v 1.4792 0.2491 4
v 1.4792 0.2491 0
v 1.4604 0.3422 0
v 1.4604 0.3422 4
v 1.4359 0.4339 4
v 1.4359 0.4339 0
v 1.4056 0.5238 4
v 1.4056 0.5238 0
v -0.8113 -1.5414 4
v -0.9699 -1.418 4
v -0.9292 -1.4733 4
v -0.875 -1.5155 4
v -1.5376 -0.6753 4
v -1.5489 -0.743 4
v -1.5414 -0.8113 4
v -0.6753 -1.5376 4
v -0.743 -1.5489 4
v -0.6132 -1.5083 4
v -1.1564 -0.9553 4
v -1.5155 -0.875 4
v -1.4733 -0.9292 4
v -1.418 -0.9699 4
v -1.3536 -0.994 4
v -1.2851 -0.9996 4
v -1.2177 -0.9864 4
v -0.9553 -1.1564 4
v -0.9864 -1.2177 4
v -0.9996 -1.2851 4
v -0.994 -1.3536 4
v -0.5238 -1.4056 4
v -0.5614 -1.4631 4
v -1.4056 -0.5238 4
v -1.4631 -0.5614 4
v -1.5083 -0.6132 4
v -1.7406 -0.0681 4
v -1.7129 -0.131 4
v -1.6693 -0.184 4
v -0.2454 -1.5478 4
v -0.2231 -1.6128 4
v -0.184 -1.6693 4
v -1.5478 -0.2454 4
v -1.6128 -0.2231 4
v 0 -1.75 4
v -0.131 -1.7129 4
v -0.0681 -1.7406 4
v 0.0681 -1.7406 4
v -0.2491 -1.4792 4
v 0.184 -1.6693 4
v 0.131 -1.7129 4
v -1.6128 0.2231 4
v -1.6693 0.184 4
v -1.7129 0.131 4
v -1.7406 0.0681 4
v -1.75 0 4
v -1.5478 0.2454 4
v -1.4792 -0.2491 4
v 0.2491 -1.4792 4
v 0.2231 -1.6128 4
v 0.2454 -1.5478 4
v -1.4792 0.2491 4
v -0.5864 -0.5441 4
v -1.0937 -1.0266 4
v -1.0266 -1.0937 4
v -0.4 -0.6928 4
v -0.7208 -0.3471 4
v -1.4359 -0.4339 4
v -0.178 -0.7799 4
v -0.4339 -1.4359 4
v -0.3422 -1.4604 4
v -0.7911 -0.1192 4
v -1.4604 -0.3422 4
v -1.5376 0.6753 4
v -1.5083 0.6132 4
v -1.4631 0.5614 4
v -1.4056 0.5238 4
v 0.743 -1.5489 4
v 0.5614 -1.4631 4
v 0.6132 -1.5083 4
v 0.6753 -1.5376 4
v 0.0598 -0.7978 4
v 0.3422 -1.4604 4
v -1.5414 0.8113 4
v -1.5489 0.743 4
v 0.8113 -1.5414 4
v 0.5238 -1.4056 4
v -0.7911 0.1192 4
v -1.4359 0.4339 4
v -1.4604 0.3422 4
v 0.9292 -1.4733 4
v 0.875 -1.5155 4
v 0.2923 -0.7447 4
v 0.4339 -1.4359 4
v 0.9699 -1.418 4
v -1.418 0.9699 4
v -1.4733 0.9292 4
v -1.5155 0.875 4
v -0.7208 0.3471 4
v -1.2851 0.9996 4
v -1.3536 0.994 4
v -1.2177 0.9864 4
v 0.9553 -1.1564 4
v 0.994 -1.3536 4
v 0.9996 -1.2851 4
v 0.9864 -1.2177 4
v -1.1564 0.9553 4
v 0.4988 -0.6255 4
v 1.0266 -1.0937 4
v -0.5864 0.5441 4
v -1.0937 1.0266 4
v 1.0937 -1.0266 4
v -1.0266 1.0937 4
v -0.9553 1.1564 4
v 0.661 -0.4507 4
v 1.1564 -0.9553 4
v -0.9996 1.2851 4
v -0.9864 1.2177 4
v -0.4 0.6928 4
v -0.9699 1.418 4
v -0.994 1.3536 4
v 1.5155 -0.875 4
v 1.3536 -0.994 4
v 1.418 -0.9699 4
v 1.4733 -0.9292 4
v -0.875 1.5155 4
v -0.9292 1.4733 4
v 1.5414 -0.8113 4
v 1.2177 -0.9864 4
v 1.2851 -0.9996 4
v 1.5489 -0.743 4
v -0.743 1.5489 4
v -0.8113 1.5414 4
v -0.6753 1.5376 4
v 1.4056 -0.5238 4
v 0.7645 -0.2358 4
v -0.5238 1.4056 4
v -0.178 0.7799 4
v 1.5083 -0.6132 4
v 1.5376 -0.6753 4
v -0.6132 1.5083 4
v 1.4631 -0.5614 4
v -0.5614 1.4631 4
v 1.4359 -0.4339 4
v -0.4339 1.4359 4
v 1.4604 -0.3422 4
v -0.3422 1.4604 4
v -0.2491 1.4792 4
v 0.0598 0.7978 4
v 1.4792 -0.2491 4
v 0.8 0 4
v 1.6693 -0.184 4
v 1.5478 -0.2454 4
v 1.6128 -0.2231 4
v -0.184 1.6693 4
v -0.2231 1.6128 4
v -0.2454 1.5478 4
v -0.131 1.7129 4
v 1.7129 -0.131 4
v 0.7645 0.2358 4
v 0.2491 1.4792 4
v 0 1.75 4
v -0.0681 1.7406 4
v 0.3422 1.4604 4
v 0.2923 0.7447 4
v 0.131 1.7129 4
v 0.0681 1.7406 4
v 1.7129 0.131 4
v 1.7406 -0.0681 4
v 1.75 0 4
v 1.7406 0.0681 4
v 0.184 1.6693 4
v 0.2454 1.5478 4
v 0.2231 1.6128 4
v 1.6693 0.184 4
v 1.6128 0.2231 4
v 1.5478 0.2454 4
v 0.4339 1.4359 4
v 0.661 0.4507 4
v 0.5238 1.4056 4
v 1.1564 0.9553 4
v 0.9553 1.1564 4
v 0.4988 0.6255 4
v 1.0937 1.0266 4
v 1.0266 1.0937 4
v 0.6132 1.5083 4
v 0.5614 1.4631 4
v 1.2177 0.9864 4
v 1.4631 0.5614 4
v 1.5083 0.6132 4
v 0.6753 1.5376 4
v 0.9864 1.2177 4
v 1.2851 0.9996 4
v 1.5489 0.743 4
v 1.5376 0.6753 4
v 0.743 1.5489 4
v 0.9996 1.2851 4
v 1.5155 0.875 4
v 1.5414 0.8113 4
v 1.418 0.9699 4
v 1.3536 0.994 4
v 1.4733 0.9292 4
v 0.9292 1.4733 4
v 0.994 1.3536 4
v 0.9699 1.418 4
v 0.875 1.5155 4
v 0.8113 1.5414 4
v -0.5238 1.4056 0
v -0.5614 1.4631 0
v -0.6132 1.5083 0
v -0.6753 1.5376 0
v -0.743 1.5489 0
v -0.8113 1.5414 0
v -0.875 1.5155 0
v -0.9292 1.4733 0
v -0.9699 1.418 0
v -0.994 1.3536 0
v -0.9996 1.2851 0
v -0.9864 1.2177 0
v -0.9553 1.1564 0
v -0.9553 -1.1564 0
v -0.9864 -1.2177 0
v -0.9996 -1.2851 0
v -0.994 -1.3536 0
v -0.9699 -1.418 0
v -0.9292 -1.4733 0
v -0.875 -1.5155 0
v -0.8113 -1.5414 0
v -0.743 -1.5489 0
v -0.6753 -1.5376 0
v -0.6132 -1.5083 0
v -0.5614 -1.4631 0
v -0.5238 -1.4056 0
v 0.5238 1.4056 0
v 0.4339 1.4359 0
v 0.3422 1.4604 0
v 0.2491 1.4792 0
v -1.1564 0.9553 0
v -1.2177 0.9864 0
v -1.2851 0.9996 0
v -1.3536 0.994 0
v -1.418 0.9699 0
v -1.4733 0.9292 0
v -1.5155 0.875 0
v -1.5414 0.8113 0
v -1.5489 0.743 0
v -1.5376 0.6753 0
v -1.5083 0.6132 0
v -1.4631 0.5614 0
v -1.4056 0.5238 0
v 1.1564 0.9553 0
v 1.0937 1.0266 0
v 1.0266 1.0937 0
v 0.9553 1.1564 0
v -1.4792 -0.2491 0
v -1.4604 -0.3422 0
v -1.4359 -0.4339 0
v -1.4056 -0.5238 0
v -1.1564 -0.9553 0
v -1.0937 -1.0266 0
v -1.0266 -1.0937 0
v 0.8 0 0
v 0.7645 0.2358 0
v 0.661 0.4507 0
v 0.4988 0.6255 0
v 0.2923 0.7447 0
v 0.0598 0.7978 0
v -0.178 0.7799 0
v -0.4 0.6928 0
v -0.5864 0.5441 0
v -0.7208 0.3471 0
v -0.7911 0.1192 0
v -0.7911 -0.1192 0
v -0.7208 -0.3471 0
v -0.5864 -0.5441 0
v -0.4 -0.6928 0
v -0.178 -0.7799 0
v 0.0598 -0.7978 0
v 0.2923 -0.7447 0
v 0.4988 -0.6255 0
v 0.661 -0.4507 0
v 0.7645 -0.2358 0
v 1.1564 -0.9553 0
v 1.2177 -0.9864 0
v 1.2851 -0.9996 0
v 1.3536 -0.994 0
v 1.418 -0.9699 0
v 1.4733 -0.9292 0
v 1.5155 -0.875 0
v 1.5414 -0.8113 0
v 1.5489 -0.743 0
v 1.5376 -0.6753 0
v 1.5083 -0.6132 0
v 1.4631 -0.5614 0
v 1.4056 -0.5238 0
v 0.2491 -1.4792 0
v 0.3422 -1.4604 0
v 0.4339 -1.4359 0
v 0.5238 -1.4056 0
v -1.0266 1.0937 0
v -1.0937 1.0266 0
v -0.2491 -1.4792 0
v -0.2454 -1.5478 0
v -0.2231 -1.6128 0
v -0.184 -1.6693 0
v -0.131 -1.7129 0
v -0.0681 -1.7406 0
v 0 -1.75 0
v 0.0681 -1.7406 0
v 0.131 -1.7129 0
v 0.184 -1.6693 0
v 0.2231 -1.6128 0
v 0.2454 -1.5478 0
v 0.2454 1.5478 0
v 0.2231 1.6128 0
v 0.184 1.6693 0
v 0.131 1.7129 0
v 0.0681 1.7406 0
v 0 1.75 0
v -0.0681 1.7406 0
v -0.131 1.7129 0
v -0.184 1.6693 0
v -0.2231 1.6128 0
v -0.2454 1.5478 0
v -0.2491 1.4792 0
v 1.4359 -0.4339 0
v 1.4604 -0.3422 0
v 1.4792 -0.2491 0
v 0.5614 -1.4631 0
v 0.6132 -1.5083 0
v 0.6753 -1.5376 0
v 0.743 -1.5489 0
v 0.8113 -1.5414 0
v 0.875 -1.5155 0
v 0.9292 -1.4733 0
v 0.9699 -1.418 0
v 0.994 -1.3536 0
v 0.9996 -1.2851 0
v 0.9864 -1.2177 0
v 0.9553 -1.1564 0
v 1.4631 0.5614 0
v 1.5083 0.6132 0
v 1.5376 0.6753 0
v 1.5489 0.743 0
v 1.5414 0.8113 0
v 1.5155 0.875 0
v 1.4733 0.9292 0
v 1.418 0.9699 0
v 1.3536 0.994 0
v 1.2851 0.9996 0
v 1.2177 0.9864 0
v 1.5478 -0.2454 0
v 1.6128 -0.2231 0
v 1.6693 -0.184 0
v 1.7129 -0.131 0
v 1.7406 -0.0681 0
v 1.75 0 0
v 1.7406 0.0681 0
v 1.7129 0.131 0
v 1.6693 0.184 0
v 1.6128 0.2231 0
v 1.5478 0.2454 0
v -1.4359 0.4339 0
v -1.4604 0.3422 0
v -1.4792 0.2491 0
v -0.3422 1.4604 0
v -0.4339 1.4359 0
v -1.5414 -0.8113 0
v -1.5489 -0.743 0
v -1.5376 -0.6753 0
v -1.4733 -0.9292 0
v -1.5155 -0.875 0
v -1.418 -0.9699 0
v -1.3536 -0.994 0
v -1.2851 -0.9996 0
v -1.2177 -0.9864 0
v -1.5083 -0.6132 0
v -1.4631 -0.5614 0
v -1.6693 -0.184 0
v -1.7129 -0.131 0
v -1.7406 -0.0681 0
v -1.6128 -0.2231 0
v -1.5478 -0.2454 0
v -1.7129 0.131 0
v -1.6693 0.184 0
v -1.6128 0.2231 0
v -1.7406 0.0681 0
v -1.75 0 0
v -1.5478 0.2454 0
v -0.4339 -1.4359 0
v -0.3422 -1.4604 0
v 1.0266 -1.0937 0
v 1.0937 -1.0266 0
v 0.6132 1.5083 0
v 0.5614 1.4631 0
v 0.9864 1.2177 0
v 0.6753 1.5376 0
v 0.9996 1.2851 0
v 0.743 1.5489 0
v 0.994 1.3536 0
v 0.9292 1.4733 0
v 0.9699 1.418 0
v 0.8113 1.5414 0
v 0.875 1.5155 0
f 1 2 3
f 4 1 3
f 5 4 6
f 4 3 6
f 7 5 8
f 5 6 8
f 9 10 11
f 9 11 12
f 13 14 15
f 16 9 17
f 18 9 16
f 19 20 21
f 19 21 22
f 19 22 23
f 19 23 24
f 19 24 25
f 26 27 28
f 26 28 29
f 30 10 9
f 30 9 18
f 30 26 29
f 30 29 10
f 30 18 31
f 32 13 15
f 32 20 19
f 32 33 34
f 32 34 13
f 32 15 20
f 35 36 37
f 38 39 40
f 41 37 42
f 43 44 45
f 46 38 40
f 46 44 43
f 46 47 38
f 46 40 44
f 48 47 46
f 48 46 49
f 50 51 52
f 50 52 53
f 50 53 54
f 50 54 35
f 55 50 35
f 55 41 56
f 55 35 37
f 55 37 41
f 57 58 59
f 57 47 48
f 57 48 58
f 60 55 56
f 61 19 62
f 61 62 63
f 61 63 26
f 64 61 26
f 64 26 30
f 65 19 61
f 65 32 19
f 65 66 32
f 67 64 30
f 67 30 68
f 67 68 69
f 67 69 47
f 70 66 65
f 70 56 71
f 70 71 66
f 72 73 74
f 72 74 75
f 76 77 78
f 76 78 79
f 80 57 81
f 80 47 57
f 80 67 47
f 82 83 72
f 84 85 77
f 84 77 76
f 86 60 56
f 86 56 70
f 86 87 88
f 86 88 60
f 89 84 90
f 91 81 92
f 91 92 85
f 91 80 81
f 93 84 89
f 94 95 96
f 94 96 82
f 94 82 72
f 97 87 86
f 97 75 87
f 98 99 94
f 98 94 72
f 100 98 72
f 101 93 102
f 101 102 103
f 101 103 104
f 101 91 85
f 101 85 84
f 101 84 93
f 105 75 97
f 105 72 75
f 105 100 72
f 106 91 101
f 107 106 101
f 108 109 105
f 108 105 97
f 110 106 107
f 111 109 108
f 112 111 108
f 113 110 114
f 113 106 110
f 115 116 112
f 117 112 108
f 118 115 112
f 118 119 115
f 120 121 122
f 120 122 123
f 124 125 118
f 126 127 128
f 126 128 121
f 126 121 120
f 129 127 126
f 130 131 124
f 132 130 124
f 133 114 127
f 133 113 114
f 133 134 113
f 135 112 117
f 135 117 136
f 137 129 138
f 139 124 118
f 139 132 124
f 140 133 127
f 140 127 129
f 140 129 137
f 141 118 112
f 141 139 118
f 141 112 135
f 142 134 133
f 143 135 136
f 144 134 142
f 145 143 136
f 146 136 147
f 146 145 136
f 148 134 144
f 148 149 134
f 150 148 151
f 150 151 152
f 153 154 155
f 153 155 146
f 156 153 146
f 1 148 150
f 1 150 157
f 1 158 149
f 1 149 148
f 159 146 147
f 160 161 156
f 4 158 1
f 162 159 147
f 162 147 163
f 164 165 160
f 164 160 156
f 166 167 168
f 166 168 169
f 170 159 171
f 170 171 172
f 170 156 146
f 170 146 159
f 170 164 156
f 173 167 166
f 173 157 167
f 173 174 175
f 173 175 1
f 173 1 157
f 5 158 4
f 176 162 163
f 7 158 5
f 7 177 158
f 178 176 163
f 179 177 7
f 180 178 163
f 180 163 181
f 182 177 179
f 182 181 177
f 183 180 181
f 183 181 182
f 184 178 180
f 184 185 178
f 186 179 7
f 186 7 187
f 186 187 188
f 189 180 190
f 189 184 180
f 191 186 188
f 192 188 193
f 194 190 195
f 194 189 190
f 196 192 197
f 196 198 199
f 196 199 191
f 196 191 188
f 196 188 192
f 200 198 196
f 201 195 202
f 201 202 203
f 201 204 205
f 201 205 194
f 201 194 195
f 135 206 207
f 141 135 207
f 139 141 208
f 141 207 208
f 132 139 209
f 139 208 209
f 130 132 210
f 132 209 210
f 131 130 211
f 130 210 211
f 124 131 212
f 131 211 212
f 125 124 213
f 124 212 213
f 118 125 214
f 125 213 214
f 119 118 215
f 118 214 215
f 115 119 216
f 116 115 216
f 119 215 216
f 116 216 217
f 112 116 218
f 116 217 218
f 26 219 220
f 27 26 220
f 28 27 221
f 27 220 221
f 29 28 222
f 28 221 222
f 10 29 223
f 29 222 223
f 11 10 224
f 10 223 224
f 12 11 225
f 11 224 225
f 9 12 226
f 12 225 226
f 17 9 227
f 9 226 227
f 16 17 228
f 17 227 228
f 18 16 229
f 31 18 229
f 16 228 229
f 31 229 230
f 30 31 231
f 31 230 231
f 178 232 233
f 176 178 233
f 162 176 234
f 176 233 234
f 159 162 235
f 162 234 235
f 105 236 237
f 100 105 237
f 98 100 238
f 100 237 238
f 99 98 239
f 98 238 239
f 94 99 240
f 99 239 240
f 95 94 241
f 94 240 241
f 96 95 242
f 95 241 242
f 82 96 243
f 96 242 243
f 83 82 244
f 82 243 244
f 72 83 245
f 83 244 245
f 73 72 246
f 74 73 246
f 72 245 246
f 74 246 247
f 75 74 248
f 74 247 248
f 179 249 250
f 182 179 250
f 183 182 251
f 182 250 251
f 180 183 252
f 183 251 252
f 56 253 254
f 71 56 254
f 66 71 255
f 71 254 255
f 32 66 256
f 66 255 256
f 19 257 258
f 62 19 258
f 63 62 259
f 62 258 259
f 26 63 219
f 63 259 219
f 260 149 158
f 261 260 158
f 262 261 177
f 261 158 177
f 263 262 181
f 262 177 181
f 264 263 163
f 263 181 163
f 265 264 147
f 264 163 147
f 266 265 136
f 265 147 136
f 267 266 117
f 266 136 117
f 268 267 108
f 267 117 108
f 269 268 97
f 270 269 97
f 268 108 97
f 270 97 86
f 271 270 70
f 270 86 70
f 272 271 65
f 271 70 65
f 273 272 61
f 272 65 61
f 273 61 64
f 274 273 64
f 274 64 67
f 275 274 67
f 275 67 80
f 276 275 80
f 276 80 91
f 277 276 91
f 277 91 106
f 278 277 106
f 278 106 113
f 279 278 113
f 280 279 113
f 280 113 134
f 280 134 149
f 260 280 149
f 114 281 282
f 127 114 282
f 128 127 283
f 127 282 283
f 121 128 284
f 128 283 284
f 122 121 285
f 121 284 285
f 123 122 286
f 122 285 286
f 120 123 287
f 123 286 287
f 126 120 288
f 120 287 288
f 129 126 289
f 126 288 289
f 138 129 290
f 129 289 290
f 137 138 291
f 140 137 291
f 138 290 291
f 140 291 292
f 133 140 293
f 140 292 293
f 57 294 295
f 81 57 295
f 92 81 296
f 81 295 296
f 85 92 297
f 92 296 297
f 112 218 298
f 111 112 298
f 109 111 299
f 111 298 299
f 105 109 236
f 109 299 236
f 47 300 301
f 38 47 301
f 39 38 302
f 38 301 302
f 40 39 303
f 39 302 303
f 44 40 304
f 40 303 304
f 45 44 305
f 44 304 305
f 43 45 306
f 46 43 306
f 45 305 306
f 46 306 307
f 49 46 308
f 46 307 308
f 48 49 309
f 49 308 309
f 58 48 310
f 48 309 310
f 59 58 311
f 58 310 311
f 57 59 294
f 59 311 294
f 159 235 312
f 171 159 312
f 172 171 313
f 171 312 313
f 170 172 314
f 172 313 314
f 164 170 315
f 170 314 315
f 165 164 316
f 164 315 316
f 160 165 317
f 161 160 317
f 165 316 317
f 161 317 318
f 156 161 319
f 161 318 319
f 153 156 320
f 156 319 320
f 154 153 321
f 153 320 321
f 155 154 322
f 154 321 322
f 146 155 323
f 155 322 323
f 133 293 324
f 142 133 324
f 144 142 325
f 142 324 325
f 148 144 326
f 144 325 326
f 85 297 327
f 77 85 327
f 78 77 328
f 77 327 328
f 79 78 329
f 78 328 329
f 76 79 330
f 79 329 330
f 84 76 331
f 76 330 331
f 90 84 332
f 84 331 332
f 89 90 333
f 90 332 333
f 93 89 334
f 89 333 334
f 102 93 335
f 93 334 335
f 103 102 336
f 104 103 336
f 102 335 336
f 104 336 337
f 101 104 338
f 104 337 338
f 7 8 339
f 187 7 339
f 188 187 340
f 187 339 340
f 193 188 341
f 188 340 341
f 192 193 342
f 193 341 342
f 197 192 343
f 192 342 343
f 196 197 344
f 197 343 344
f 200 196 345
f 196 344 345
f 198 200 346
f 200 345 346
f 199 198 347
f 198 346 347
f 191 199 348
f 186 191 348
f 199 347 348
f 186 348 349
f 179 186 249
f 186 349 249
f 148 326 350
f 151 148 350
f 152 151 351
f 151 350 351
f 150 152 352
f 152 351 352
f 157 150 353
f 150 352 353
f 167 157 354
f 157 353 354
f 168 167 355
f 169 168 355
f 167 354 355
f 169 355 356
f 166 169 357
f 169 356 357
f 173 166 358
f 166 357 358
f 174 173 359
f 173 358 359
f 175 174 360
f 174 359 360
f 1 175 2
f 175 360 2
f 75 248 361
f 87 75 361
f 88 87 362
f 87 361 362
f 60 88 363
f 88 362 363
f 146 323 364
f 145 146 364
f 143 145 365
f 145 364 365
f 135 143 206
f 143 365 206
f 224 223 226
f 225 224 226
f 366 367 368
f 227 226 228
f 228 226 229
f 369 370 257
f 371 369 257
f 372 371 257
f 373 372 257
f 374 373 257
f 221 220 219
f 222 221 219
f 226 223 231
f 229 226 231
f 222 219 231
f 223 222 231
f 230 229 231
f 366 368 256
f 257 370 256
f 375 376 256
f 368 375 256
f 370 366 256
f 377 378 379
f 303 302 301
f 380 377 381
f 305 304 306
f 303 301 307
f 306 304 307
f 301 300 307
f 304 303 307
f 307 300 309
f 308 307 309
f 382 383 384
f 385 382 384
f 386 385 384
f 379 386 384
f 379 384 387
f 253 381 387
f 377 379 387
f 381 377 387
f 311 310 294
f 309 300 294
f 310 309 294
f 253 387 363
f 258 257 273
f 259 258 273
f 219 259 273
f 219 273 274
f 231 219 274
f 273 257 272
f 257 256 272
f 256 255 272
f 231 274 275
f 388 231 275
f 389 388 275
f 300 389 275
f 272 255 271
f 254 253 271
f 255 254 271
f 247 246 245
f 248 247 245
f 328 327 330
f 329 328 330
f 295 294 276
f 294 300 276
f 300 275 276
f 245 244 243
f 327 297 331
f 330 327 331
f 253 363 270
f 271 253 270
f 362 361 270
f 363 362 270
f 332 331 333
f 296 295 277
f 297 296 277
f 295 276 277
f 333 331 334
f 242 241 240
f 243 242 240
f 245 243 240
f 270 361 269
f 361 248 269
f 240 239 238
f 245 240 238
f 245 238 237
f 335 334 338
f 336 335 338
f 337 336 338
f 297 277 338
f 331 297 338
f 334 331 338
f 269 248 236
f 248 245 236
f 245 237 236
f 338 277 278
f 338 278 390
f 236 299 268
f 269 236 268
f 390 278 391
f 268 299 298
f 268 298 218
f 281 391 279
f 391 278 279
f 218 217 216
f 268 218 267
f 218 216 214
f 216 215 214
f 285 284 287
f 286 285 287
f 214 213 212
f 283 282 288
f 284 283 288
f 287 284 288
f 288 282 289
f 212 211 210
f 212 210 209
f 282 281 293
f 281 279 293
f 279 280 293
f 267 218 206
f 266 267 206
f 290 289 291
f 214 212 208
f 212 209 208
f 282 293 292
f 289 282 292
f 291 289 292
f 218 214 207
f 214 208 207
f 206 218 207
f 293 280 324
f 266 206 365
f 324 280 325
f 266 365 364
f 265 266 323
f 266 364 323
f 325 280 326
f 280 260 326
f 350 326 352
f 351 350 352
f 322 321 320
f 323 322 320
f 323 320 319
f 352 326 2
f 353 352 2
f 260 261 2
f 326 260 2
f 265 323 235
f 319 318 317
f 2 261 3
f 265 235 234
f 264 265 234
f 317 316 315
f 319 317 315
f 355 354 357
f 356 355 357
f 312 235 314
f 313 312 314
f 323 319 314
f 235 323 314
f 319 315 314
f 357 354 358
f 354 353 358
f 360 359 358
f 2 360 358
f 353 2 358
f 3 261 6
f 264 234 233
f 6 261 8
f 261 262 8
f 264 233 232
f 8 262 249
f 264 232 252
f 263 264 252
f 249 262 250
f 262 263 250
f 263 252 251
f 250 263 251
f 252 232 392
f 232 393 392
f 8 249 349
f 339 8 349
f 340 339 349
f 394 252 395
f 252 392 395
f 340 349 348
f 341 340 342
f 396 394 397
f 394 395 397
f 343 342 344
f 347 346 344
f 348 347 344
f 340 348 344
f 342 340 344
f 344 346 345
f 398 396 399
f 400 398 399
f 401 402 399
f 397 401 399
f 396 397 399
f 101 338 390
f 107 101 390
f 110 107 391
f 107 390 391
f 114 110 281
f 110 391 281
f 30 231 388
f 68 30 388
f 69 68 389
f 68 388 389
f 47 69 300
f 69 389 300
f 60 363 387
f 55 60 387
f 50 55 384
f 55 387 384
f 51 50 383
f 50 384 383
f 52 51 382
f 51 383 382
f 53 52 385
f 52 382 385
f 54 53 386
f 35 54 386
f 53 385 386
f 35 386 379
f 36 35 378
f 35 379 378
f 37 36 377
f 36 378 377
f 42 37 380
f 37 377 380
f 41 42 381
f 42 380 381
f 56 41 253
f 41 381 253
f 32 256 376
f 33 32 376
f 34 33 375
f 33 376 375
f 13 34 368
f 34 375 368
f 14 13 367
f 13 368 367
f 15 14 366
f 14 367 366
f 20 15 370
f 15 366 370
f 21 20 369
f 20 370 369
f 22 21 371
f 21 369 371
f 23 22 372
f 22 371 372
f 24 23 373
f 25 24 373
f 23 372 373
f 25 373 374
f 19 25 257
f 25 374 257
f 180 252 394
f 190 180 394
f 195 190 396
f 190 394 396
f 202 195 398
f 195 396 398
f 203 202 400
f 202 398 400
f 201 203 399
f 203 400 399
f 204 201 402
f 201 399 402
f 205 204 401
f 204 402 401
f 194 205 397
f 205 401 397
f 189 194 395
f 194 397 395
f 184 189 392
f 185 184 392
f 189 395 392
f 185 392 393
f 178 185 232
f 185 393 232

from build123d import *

# Parameters (mm, degrees)
BOSS_EXTRU_1_DEPTH = 4
TROU_TARAUD_M21_D  = 1.6


with BuildPart() as part:
    # Esquisse1 → Boss.-Extru.1 (new body)
    with BuildSketch(Plane.XY):
        with BuildLine():
            ThreePointArc((0.249130432, 1.479166667), (0, 1.75), (-0.249130432, 1.479166667))
            ThreePointArc((-0.249130432, 1.479166667), (-0.388228568, 1.448888739), (-0.52383005, 1.405561126))
            ThreePointArc((-0.52383005, 1.405561126), (-0.875, 1.515544457), (-0.955336616, 1.156430694))
            ThreePointArc((-0.955336616, 1.156430694), (-1.060660172, 1.060660172), (-1.156430694, 0.955336616))
            ThreePointArc((-1.156430694, 0.955336616), (-1.515544457, 0.875), (-1.405561126, 0.52383005))
            ThreePointArc((-1.405561126, 0.52383005), (-1.448888739, 0.388228568), (-1.479166667, 0.249130432))
            ThreePointArc((-1.479166667, 0.249130432), (-1.75, 0), (-1.479166667, -0.249130432))
            ThreePointArc((-1.479166667, -0.249130432), (-1.448888739, -0.388228568), (-1.405561126, -0.52383005))
            ThreePointArc((-1.405561126, -0.52383005), (-1.515544457, -0.875), (-1.156430694, -0.955336616))
            ThreePointArc((-1.156430694, -0.955336616), (-1.060660172, -1.060660172), (-0.955336616, -1.156430694))
            ThreePointArc((-0.955336616, -1.156430694), (-0.875, -1.515544457), (-0.52383005, -1.405561126))
            ThreePointArc((-0.52383005, -1.405561126), (-0.388228568, -1.448888739), (-0.249130432, -1.479166667))
            ThreePointArc((-0.249130432, -1.479166667), (0, -1.75), (0.249130432, -1.479166667))
            ThreePointArc((0.249130432, -1.479166667), (0.388228568, -1.448888739), (0.52383005, -1.405561126))
            ThreePointArc((0.52383005, -1.405561126), (0.875, -1.515544457), (0.955336616, -1.156430694))
            ThreePointArc((0.955336616, -1.156430694), (1.060660172, -1.060660172), (1.156430694, -0.955336616))
            ThreePointArc((1.156430694, -0.955336616), (1.515544457, -0.875), (1.405561126, -0.52383005))
            ThreePointArc((1.405561126, -0.52383005), (1.448888739, -0.388228568), (1.479166667, -0.249130432))
            ThreePointArc((1.479166667, -0.249130432), (1.75, 0), (1.479166667, 0.249130432))
            ThreePointArc((1.479166667, 0.249130432), (1.448888739, 0.388228568), (1.405561126, 0.52383005))
            ThreePointArc((1.405561126, 0.52383005), (1.515544457, 0.875), (1.156430694, 0.955336616))
            ThreePointArc((1.156430694, 0.955336616), (1.060660172, 1.060660172), (0.955336616, 1.156430694))
            ThreePointArc((0.955336616, 1.156430694), (0.875, 1.515544457), (0.52383005, 1.405561126))
            ThreePointArc((0.52383005, 1.405561126), (0.388228568, 1.448888739), (0.249130432, 1.479166667))
        make_face()
    extrude(amount=BOSS_EXTRU_1_DEPTH)

    # Trou taraudé M21 (through all)
    with Locations(Plane(origin=(0, 0, 0), x_dir=(-1, 0, 0), z_dir=(0, 0, -1))):
        with Locations((0, 0)):
            Hole(TROU_TARAUD_M21_D / 2)


solid = part.part
